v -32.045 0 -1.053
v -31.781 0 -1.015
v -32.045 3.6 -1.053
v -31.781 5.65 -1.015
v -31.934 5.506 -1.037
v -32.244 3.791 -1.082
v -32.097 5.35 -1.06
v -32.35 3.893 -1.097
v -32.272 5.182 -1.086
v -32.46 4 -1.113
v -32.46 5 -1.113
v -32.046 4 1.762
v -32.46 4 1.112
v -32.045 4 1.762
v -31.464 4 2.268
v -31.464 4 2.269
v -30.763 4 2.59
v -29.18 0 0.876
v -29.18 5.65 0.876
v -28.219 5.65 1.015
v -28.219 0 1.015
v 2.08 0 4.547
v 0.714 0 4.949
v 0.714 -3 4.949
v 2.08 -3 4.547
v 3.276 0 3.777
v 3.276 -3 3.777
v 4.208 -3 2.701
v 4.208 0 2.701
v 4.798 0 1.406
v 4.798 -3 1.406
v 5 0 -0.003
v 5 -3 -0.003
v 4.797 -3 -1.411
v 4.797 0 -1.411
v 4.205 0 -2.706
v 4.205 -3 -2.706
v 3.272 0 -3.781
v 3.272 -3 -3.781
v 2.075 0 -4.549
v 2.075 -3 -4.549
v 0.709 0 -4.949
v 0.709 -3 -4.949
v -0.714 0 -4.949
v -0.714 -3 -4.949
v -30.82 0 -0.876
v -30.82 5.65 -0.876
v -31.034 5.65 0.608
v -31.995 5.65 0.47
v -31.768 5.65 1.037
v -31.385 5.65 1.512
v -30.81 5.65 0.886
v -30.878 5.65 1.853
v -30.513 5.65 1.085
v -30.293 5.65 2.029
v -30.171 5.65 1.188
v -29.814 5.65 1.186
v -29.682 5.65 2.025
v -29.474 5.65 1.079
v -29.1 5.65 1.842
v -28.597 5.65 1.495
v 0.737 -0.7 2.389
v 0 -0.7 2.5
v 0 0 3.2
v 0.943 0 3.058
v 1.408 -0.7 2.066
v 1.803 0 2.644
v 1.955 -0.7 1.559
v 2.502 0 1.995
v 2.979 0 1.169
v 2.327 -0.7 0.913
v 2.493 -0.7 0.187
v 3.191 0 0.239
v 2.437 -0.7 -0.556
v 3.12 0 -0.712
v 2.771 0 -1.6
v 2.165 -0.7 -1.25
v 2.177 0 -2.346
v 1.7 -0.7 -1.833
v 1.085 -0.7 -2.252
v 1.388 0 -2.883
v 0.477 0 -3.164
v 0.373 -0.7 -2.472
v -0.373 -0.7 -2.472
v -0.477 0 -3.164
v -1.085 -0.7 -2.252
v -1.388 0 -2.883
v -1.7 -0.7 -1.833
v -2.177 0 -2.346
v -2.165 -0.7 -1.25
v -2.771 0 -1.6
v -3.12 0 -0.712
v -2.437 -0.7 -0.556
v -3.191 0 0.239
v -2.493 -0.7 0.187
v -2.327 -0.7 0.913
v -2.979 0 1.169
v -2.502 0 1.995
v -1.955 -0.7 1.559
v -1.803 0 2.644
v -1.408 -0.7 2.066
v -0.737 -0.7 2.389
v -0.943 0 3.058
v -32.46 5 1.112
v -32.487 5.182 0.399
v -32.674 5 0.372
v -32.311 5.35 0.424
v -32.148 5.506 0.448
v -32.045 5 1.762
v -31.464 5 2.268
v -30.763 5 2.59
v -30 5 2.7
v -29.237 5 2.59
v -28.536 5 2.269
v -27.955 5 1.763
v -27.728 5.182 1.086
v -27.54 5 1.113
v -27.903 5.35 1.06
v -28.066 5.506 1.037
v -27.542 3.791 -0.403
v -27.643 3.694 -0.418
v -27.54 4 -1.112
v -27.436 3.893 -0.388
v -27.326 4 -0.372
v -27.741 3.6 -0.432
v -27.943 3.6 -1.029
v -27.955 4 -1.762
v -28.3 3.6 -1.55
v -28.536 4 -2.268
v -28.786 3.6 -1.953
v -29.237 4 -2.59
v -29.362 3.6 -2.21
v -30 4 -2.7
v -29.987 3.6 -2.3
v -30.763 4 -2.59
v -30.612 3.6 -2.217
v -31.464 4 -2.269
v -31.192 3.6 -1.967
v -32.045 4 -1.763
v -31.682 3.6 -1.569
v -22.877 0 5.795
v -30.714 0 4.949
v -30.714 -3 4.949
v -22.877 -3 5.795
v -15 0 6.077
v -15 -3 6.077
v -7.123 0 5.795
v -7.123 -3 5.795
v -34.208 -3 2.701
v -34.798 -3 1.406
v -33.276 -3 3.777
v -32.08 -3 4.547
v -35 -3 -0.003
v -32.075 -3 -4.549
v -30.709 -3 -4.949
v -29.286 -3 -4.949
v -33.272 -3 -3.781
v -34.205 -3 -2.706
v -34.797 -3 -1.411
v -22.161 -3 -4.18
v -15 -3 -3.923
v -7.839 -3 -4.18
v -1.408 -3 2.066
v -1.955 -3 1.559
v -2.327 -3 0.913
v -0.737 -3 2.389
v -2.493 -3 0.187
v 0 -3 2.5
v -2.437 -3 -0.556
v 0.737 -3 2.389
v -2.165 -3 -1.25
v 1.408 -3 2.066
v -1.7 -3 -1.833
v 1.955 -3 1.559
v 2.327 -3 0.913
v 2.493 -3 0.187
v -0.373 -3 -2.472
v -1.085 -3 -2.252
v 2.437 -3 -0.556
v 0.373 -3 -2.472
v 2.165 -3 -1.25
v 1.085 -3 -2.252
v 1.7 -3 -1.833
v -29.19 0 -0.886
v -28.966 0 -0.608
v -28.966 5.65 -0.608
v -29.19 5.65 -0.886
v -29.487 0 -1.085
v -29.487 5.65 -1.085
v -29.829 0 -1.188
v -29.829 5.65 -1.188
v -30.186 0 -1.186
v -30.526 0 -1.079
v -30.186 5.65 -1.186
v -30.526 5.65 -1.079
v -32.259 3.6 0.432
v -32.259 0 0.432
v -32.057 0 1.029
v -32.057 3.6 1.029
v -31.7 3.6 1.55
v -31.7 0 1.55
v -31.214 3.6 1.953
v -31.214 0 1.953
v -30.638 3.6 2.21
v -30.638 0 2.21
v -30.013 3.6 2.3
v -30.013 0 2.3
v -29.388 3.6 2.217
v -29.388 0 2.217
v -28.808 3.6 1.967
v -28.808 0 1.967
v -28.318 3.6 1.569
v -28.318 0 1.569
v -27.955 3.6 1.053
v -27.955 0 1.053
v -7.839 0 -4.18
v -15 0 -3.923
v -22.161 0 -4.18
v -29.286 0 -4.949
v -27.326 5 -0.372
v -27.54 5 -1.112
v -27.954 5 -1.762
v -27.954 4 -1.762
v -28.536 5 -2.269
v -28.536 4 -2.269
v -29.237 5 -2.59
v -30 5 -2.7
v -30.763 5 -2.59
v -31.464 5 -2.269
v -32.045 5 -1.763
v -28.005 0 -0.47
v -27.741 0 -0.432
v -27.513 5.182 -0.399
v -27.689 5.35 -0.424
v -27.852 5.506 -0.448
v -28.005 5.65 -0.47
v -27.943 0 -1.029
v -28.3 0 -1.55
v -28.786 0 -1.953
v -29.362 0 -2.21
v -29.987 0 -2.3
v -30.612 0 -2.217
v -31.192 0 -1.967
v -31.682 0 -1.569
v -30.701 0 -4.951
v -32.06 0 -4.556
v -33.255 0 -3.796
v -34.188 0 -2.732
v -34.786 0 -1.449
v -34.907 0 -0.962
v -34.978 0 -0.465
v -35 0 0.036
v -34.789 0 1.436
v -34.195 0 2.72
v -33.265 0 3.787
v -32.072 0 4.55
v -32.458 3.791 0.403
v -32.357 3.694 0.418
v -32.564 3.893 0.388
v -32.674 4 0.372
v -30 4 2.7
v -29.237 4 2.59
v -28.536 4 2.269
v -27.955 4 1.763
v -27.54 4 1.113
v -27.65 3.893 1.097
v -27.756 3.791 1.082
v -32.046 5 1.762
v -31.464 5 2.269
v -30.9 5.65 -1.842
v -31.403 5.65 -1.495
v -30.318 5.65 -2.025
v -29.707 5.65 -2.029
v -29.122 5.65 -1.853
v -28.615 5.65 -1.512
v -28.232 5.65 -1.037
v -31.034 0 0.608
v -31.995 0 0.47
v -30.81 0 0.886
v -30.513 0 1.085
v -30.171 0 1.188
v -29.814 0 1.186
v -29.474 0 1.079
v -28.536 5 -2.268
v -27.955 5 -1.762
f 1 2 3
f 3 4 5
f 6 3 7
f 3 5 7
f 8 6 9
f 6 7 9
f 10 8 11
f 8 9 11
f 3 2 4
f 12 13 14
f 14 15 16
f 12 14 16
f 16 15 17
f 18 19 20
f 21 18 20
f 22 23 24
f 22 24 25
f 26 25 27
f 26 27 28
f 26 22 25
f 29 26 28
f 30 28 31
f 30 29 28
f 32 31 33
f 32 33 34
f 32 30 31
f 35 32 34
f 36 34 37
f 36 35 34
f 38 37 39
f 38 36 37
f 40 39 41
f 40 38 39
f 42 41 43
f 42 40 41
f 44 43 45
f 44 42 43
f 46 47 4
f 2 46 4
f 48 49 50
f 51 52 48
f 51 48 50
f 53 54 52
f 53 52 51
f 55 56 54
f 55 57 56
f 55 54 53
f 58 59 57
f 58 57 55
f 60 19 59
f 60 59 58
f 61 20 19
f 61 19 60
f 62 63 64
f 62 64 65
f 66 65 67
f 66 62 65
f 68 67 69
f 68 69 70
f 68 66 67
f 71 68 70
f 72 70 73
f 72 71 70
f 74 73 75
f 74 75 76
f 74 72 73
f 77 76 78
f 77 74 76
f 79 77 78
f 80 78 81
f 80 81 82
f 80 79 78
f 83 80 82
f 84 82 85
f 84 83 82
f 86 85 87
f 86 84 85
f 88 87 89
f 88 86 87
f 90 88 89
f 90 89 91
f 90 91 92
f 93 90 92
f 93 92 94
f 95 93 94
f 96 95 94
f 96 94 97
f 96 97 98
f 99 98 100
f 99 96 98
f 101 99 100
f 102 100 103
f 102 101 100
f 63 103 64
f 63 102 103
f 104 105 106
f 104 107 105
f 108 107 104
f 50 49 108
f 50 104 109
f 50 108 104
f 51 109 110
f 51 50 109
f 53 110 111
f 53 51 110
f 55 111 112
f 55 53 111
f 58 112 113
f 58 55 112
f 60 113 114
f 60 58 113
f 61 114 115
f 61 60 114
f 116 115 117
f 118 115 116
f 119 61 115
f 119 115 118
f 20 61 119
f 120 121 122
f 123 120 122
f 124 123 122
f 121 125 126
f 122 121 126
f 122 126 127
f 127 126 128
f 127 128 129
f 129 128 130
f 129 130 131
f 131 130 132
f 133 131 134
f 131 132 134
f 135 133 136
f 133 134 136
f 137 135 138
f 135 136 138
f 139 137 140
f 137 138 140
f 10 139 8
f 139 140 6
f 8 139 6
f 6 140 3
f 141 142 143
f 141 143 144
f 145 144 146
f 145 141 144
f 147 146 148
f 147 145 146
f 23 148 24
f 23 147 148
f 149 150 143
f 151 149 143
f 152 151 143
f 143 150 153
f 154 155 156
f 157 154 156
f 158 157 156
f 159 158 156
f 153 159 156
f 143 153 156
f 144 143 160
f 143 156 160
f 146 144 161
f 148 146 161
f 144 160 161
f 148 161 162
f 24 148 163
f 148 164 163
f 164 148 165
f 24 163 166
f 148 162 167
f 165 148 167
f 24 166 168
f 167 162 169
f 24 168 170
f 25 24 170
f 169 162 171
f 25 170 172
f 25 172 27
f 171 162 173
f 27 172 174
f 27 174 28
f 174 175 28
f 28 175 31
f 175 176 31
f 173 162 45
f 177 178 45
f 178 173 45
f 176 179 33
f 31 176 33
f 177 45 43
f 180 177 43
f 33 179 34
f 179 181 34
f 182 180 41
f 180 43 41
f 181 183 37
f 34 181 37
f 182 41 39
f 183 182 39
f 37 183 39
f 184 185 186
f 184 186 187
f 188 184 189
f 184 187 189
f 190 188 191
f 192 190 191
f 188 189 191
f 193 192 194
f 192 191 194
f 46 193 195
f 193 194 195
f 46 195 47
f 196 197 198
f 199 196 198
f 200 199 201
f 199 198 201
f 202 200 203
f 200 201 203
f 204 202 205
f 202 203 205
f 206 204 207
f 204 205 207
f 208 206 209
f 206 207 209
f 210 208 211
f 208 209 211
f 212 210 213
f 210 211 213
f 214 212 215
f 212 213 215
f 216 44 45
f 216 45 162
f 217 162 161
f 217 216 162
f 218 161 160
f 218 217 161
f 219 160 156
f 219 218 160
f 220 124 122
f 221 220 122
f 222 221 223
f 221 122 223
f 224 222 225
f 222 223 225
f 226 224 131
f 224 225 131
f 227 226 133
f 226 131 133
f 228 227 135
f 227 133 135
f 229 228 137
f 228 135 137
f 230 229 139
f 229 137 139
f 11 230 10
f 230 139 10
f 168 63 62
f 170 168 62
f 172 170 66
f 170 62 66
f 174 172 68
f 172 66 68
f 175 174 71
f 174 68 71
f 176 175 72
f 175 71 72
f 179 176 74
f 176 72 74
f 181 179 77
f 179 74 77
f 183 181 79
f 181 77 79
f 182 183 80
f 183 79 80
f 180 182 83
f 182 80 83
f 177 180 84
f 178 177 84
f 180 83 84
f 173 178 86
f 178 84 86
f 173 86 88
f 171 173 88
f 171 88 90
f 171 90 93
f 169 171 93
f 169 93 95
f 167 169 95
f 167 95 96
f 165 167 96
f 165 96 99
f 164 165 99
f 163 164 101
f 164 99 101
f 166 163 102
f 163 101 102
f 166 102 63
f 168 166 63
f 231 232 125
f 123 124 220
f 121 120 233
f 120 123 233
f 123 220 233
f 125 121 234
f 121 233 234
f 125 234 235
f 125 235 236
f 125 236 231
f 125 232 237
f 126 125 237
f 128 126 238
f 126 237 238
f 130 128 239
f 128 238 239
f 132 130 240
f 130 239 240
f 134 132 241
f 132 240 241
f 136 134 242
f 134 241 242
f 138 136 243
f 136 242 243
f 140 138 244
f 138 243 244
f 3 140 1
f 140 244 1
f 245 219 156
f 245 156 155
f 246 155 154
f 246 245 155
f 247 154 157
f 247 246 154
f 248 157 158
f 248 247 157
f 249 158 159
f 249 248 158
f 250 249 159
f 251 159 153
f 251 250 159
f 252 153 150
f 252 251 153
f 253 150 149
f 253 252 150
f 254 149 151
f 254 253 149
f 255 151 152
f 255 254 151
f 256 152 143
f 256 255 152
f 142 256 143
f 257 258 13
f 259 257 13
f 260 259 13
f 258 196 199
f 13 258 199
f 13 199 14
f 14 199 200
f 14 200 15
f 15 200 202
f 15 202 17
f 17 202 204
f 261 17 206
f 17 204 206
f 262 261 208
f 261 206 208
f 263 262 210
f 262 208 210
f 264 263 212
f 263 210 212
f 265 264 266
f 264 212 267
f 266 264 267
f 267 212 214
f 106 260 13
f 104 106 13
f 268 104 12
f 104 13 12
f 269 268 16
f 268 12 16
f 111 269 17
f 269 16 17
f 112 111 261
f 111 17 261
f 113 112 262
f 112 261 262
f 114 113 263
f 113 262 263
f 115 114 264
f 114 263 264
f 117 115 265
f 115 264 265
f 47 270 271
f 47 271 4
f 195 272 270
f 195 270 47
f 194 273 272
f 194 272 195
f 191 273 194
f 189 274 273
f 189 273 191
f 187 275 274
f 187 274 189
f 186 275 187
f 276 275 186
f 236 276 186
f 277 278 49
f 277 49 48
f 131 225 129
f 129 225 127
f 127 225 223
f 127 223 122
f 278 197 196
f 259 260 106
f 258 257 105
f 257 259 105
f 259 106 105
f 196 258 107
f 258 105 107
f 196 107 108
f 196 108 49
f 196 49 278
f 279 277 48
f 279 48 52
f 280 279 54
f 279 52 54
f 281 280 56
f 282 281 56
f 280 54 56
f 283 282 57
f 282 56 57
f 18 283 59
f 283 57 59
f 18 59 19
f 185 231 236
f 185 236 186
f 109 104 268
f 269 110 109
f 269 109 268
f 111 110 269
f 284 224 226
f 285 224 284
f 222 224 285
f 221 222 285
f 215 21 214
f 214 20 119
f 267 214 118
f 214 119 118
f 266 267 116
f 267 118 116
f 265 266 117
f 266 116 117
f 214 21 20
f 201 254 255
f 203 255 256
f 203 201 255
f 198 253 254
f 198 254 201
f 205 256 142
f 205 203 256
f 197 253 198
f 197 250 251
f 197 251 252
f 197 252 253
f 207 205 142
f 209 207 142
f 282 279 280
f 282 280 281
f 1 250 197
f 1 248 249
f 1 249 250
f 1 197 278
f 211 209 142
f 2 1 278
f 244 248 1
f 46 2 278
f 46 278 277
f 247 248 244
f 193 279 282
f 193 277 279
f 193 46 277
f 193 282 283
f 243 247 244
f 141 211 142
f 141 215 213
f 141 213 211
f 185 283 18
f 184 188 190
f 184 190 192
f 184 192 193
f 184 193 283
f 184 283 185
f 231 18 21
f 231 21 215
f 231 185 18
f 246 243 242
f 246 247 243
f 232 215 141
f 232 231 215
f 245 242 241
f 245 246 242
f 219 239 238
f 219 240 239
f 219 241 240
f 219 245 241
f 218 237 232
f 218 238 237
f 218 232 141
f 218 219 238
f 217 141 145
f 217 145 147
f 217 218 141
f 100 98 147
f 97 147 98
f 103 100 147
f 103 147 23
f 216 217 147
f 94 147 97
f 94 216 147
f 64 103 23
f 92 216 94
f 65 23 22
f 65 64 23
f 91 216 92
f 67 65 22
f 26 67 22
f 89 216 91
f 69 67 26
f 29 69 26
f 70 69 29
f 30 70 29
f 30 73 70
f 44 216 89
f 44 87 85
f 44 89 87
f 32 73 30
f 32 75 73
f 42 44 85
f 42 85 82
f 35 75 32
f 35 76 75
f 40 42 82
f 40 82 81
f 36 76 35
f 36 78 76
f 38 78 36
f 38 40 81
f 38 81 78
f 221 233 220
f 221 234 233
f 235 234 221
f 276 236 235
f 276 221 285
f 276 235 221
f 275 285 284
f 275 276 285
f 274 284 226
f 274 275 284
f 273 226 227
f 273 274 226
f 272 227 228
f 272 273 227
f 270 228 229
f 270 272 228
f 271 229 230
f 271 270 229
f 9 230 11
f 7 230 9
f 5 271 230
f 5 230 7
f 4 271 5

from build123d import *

# Parameters (mm, degrees)
SKETCH1_R           = 5
BOSS_EXTRUDE1_DEPTH = 3
SKETCH2_R           = 2.5
CUT_EXTRUDE1_DEPTH  = 3
CHAMFER1_SIZE       = 0.7
SKETCH3_R           = 2.3
BOSS_EXTRUDE2_DEPTH = 4
SKETCH4_R           = 2.7
BOSS_EXTRUDE3_DEPTH = 1
CHAMFER2_SIZE       = 0.4
SKETCH5_R           = 2.05
BOSS_EXTRUDE4_DEPTH = 0.65
CHAMFER3_SIZE       = 0.65
CUT_EXTRUDE2_REACH  = 38.562
SKETCH7_R           = 1.2
CUT_EXTRUDE3_DEPTH  = 5.65


with BuildPart() as part:
    # Sketch1 → Boss-Extrude1 (new body)
    with BuildSketch(Plane(origin=(0, 0, 0), x_dir=(1, 0, 0), z_dir=(0, 1, 0))):
        with Locations((-30, 0)):
            Circle(SKETCH1_R)
        with BuildLine():
            ThreePointArc((0.714285714, -4.948716593), (-4.948716593, -0.714285714), (-0.714285714, 4.948716593))
            ThreePointArc((-0.714285714, 4.948716593), (-15, 3.923048454), (-29.285714286, 4.948716593))
            ThreePointArc((-29.285714286, 4.948716593), (-26.22035527, 3.273268354), (-25, 0))
            ThreePointArc((-25, 0), (-26.726731646, -3.77964473), (-30.714285714, -4.948716593))
            ThreePointArc((-30.714285714, -4.948716593), (-15, -6.076951546), (0.714285714, -4.948716593))
        make_face()
        Circle(SKETCH1_R)
    extrude(amount=-BOSS_EXTRUDE1_DEPTH)

    # Sketch2 → Cut-Extrude1 (cut)
    with BuildSketch(Plane(origin=(0, 0, 0), x_dir=(1, 0, 0), z_dir=(0, 1, 0))):
        with Locations(Location((0, 0, 0), (0, 0, 270))):
            Circle(SKETCH2_R)
    extrude(amount=-CUT_EXTRUDE1_DEPTH, mode=Mode.SUBTRACT)

    # Chamfer1
    chamfer1_edges = [part.edges().sort_by_distance(p)[0] for p in [
        (0, 0, -2.5),
    ]]
    chamfer(chamfer1_edges, length=CHAMFER1_SIZE)

    # Sketch3 → Boss-Extrude2 (add)
    with BuildSketch(Plane(origin=(0, 0, 0), x_dir=(1, 0, 0), z_dir=(0, 1, 0))):
        with Locations(Location((-30, 0, 0), (0, 0, 270))):
            Circle(SKETCH3_R)
    extrude(amount=BOSS_EXTRUDE2_DEPTH)

    # Sketch4 → Boss-Extrude3 (add)
    with BuildSketch(Plane(origin=(0, 4, 0), x_dir=(1, 0, 0), z_dir=(0, 1, 0))):
        with Locations(Location((-30, 0, 0), (0, 0, 270))):
            Circle(SKETCH4_R)
    extrude(amount=BOSS_EXTRUDE3_DEPTH)

    # Chamfer2
    chamfer2_edges = [part.edges().sort_by_distance(p)[0] for p in [
        (-30, 4, -2.3),
    ]]
    chamfer(chamfer2_edges, length=CHAMFER2_SIZE - 0.0001)  # a hair under: the kernel refuses the full size

    # Sketch5 → Boss-Extrude4 (add)
    with BuildSketch(Plane(origin=(0, 5, 0), x_dir=(1, 0, 0), z_dir=(0, 1, 0))):
        with Locations(Location((-30, 0, 0), (0, 0, 270))):
            Circle(SKETCH5_R)
    extrude(amount=BOSS_EXTRUDE4_DEPTH)

    # Chamfer3
    chamfer3_edges = [part.edges().sort_by_distance(p)[0] for p in [
        (-30, 5, -2.05),
    ]]
    chamfer(chamfer3_edges, length=CHAMFER3_SIZE - 0.0001)  # a hair under: the kernel refuses the full size

    # Cut-Extrude2: up to this face of the body (flat: up to its plane)
    cut_extrude2_end = Plane(part.part.faces().sort_by_distance((-15.705189874, 0, 0.65316875))[0])
    # Sketch6 → Cut-Extrude2 (cut, up to the picked face)
    with BuildSketch(Plane(origin=(0, 5.65, 0), x_dir=(1, 0, 0), z_dir=(0, 1, 0)), mode=Mode.PRIVATE) as cut_extrude2_sk1:
        with BuildLine():
            ThreePointArc((-34.78558394, 1.448511772), (-34.948716593, 0.714285714), (-34.999869654, -0.036103206))
            Line((-34.999869654, -0.036103206), (-31.995452759, -0.469753431))
            ThreePointArc((-31.995452759, -0.469753431), (-32.028973803, 0.292857143), (-31.781167045, 1.014861547))
            Line((-31.781167045, 1.014861547), (-34.78558394, 1.448511772))
        make_face()
    cut_extrude2_tool1 = split(extrude(cut_extrude2_sk1.sketch, amount=-CUT_EXTRUDE2_REACH, mode=Mode.PRIVATE), bisect_by=cut_extrude2_end, keep=Keep.BOTH, mode=Mode.PRIVATE)
    # Sketch6 → Cut-Extrude2 (cut, up to the picked face)
    with BuildSketch(Plane(origin=(0, 5.65, 0), x_dir=(1, 0, 0), z_dir=(0, 1, 0)), mode=Mode.PRIVATE) as cut_extrude2_sk2:
        with BuildLine():
            Line((-28.218832955, -1.014861547), (-25.21441606, -1.448511772))
            ThreePointArc((-25.21441606, -1.448511772), (-25.053894476, -0.732147629), (-25, 0))
            ThreePointArc((-25, 0), (-25.000032587, 0.01805172), (-25.000130346, 0.036103206))
            Line((-25.000130346, 0.036103206), (-28.004547241, 0.469753431))
            ThreePointArc((-28.004547241, 0.469753431), (-27.963682471, 0.236454905), (-27.95, 0))
            ThreePointArc((-27.95, 0), (-28.018347603, -0.524932166), (-28.218832955, -1.014861547))
        make_face()
    cut_extrude2_tool2 = split(extrude(cut_extrude2_sk2.sketch, amount=-CUT_EXTRUDE2_REACH, mode=Mode.PRIVATE), bisect_by=cut_extrude2_end, keep=Keep.BOTH, mode=Mode.PRIVATE)
    # Sketch6 → Cut-Extrude2 (cut, up to the picked face)
    with BuildSketch(Plane(origin=(0, 5.65, 0), x_dir=(1, 0, 0), z_dir=(0, 1, 0)), mode=Mode.PRIVATE) as cut_extrude2_sk3:
        with BuildLine():
            ThreePointArc((-31.781167045, 1.014861547), (-32.028973803, 0.292857143), (-31.995452759, -0.469753431))
            Line((-31.995452759, -0.469753431), (-28.218832955, -1.014861547))
            ThreePointArc((-28.218832955, -1.014861547), (-28.018347603, -0.524932166), (-27.95, 0))
            ThreePointArc((-27.95, 0), (-27.963682471, 0.236454905), (-28.004547241, 0.469753431))
            Line((-28.004547241, 0.469753431), (-31.781167045, 1.014861547))
        make_face()
    cut_extrude2_tool3 = split(extrude(cut_extrude2_sk3.sketch, amount=-CUT_EXTRUDE2_REACH, mode=Mode.PRIVATE), bisect_by=cut_extrude2_end, keep=Keep.BOTH, mode=Mode.PRIVATE)
    # Sketch6 → Cut-Extrude2 (cut, up to the picked face)
    with BuildSketch(Plane(origin=(0, 5.65, 0), x_dir=(1, 0, 0), z_dir=(0, 1, 0)), mode=Mode.PRIVATE) as cut_extrude2_sk4:
        with BuildLine():
            ThreePointArc((-34.78558394, 1.448511772), (-34.948716593, 0.714285714), (-34.999869654, -0.036103206))
            Line((-34.999869654, -0.036103206), (-31.995452759, -0.469753431))
            ThreePointArc((-31.995452759, -0.469753431), (-32.028973803, 0.292857143), (-31.781167045, 1.014861547))
            Line((-31.781167045, 1.014861547), (-34.78558394, 1.448511772))
        make_face()
    cut_extrude2_tool4 = split(extrude(cut_extrude2_sk4.sketch, amount=-CUT_EXTRUDE2_REACH, mode=Mode.PRIVATE), bisect_by=cut_extrude2_end, keep=Keep.BOTH, mode=Mode.PRIVATE)
    # Sketch6 → Cut-Extrude2 (cut, up to the picked face)
    with BuildSketch(Plane(origin=(0, 5.65, 0), x_dir=(1, 0, 0), z_dir=(0, 1, 0)), mode=Mode.PRIVATE) as cut_extrude2_sk5:
        with BuildLine():
            Line((-28.218832955, -1.014861547), (-25.21441606, -1.448511772))
            ThreePointArc((-25.21441606, -1.448511772), (-25.053894476, -0.732147629), (-25, 0))
            ThreePointArc((-25, 0), (-25.000032587, 0.01805172), (-25.000130346, 0.036103206))
            Line((-25.000130346, 0.036103206), (-28.004547241, 0.469753431))
            ThreePointArc((-28.004547241, 0.469753431), (-27.963682471, 0.236454905), (-27.95, 0))
            ThreePointArc((-27.95, 0), (-28.018347603, -0.524932166), (-28.218832955, -1.014861547))
        make_face()
    cut_extrude2_tool5 = split(extrude(cut_extrude2_sk5.sketch, amount=-CUT_EXTRUDE2_REACH, mode=Mode.PRIVATE), bisect_by=cut_extrude2_end, keep=Keep.BOTH, mode=Mode.PRIVATE)
    add(cut_extrude2_tool1.solids().sort_by(Axis((-33.456178, 5.65, -0.498856), (0, -1, 0)))[0], mode=Mode.SUBTRACT)
    add(cut_extrude2_tool2.solids().sort_by(Axis((-26.543822, 5.65, 0.498856), (0, -1, 0)))[0], mode=Mode.SUBTRACT)
    add(cut_extrude2_tool3.solids().sort_by(Axis((-30, 5.65, 0), (0, -1, 0)))[0], mode=Mode.SUBTRACT)
    add(cut_extrude2_tool4.solids().sort_by(Axis((-33.456178, 5.65, -0.498856), (0, -1, 0)))[0], mode=Mode.SUBTRACT)
    add(cut_extrude2_tool5.solids().sort_by(Axis((-26.543822, 5.65, 0.498856), (0, -1, 0)))[0], mode=Mode.SUBTRACT)

    # Sketch7 → Cut-Extrude3 (cut)
    with BuildSketch(Plane(origin=(0, 5.65, 0), x_dir=(1, 0, 0), z_dir=(0, 1, 0))):
        with Locations((-30, 0)):
            Circle(SKETCH7_R)
    extrude(amount=-CUT_EXTRUDE3_DEPTH, mode=Mode.SUBTRACT)


solid = part.part
